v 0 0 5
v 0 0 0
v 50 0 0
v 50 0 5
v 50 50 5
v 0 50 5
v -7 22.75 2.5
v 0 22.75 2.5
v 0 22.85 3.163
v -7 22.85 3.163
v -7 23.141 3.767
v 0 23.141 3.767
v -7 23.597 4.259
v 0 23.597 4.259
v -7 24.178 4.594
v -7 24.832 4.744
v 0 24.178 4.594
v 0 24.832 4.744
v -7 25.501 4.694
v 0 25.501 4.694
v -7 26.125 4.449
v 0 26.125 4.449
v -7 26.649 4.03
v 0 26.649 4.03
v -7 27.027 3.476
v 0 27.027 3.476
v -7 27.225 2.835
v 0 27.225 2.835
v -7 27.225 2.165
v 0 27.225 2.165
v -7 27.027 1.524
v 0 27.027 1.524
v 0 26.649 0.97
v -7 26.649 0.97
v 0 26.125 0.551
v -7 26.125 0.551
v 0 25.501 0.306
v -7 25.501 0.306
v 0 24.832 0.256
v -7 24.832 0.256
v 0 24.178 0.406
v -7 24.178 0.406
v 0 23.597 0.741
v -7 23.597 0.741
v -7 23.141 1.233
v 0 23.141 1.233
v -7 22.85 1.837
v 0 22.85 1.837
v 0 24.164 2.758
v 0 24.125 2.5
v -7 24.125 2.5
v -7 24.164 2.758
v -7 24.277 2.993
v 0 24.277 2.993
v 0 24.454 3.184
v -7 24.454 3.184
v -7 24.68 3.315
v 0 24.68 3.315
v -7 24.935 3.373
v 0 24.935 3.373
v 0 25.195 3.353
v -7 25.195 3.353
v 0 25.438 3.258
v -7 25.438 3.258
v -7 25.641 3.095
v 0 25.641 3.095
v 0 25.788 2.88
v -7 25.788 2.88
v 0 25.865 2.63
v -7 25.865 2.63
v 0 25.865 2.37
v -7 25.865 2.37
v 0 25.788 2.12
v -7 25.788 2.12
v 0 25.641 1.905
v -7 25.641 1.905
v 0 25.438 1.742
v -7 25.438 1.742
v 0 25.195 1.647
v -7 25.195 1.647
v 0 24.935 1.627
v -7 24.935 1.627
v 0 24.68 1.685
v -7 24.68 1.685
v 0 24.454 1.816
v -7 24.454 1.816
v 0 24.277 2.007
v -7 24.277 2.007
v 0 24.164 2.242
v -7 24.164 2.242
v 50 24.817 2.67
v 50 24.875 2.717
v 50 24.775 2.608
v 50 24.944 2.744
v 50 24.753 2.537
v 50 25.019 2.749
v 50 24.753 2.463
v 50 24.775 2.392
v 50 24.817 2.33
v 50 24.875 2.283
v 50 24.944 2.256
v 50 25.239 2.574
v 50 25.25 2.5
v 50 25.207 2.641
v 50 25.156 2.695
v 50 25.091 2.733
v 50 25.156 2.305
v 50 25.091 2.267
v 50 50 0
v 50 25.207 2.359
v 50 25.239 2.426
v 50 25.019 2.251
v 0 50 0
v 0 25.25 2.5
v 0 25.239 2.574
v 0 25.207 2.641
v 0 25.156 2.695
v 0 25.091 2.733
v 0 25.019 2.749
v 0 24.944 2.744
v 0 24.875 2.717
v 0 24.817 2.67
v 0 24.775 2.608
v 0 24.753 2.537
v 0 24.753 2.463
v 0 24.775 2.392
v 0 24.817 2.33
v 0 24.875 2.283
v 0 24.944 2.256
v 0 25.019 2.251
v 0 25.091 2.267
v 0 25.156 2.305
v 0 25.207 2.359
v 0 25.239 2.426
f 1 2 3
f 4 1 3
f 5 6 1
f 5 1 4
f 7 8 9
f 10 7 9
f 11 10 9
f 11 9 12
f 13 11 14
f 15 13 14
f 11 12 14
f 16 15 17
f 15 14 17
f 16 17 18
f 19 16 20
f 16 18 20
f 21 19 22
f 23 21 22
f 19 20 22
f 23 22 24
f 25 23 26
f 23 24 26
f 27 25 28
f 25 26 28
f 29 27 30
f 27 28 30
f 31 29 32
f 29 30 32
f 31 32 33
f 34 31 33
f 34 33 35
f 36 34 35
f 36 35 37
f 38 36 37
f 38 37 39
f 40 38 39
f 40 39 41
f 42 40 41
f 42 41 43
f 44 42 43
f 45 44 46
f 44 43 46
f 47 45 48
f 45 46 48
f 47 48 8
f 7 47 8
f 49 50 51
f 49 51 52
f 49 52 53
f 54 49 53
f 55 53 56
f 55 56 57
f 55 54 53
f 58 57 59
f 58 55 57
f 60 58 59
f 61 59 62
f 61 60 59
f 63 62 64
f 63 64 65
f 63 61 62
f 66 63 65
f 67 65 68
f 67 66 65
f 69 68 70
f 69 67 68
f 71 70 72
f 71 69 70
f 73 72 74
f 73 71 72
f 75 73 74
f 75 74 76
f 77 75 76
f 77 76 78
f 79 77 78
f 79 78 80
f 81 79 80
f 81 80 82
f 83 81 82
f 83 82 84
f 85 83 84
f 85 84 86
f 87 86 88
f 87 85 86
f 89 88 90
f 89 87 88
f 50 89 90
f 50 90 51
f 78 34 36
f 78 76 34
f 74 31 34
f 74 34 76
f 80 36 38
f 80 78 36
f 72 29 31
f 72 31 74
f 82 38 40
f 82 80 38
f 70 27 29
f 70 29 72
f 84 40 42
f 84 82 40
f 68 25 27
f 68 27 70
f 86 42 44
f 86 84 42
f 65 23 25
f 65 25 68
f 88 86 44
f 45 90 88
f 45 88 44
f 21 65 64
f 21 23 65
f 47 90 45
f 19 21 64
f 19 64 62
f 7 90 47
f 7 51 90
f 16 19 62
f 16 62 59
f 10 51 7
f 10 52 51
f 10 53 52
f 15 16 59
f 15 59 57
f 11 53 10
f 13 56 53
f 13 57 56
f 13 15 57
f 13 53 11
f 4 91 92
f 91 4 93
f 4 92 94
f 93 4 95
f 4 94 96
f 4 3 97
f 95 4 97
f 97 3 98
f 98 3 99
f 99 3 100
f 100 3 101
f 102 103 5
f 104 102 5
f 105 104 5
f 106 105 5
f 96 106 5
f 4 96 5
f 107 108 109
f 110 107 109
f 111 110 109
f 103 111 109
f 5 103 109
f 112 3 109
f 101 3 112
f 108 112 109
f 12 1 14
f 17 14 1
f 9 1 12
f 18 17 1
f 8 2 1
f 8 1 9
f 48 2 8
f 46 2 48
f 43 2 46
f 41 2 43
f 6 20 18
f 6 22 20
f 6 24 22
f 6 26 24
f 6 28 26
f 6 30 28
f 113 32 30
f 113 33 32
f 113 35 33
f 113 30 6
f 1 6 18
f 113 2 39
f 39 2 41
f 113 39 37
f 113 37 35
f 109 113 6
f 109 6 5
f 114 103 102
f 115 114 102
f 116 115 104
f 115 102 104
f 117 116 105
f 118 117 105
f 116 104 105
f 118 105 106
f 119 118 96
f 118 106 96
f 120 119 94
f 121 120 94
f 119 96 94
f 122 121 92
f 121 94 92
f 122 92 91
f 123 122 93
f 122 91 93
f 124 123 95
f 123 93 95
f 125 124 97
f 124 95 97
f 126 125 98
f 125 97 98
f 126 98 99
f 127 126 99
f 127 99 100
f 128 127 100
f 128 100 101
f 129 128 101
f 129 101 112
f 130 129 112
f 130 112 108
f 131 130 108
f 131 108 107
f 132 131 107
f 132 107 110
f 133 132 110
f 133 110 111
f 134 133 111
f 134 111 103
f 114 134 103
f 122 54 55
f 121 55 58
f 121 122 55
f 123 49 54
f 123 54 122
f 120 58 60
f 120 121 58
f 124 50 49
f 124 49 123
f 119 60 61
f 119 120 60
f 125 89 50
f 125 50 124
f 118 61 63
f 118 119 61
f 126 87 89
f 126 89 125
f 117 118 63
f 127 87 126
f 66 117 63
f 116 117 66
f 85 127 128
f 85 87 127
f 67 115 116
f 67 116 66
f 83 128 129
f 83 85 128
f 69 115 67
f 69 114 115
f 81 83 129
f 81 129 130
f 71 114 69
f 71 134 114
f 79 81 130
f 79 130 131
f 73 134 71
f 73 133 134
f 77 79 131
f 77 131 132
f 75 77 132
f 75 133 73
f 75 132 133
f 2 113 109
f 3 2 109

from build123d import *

# Parameters (mm, degrees)
F0_W     = 50
F0_H     = 50
F1_DEPTH = 5
F2_R     = 0.25
F3_DEPTH = 55.8
F4_R     = 2.25
F4_R_2   = 0.875
F5_DEPTH = 7


with BuildPart() as f1:
    # F0 (on Top) → F1 (new body)
    with BuildSketch(Plane.XY):
        with Locations((25, 25)):
            Rectangle(F0_W, F0_H)
    extrude(amount=F1_DEPTH)

    # F2 (on face) → F3 (cut)
    with BuildSketch(Plane.YZ.offset(50)):
        with Locations((25, 2.5)):
            Circle(F2_R)
    extrude(amount=-F3_DEPTH, mode=Mode.SUBTRACT)

    # F4 (on face) → F5 (join)
    with BuildSketch(Plane(origin=(0, 0, 0), x_dir=(0, -1, 0), z_dir=(-1, 0, 0))):
        with Locations((-25, 2.5)):
            Circle(F4_R)
        with Locations((-25, 2.5)):
            Circle(F4_R_2, mode=Mode.SUBTRACT)
    extrude(amount=F5_DEPTH)


solid = f1.part
